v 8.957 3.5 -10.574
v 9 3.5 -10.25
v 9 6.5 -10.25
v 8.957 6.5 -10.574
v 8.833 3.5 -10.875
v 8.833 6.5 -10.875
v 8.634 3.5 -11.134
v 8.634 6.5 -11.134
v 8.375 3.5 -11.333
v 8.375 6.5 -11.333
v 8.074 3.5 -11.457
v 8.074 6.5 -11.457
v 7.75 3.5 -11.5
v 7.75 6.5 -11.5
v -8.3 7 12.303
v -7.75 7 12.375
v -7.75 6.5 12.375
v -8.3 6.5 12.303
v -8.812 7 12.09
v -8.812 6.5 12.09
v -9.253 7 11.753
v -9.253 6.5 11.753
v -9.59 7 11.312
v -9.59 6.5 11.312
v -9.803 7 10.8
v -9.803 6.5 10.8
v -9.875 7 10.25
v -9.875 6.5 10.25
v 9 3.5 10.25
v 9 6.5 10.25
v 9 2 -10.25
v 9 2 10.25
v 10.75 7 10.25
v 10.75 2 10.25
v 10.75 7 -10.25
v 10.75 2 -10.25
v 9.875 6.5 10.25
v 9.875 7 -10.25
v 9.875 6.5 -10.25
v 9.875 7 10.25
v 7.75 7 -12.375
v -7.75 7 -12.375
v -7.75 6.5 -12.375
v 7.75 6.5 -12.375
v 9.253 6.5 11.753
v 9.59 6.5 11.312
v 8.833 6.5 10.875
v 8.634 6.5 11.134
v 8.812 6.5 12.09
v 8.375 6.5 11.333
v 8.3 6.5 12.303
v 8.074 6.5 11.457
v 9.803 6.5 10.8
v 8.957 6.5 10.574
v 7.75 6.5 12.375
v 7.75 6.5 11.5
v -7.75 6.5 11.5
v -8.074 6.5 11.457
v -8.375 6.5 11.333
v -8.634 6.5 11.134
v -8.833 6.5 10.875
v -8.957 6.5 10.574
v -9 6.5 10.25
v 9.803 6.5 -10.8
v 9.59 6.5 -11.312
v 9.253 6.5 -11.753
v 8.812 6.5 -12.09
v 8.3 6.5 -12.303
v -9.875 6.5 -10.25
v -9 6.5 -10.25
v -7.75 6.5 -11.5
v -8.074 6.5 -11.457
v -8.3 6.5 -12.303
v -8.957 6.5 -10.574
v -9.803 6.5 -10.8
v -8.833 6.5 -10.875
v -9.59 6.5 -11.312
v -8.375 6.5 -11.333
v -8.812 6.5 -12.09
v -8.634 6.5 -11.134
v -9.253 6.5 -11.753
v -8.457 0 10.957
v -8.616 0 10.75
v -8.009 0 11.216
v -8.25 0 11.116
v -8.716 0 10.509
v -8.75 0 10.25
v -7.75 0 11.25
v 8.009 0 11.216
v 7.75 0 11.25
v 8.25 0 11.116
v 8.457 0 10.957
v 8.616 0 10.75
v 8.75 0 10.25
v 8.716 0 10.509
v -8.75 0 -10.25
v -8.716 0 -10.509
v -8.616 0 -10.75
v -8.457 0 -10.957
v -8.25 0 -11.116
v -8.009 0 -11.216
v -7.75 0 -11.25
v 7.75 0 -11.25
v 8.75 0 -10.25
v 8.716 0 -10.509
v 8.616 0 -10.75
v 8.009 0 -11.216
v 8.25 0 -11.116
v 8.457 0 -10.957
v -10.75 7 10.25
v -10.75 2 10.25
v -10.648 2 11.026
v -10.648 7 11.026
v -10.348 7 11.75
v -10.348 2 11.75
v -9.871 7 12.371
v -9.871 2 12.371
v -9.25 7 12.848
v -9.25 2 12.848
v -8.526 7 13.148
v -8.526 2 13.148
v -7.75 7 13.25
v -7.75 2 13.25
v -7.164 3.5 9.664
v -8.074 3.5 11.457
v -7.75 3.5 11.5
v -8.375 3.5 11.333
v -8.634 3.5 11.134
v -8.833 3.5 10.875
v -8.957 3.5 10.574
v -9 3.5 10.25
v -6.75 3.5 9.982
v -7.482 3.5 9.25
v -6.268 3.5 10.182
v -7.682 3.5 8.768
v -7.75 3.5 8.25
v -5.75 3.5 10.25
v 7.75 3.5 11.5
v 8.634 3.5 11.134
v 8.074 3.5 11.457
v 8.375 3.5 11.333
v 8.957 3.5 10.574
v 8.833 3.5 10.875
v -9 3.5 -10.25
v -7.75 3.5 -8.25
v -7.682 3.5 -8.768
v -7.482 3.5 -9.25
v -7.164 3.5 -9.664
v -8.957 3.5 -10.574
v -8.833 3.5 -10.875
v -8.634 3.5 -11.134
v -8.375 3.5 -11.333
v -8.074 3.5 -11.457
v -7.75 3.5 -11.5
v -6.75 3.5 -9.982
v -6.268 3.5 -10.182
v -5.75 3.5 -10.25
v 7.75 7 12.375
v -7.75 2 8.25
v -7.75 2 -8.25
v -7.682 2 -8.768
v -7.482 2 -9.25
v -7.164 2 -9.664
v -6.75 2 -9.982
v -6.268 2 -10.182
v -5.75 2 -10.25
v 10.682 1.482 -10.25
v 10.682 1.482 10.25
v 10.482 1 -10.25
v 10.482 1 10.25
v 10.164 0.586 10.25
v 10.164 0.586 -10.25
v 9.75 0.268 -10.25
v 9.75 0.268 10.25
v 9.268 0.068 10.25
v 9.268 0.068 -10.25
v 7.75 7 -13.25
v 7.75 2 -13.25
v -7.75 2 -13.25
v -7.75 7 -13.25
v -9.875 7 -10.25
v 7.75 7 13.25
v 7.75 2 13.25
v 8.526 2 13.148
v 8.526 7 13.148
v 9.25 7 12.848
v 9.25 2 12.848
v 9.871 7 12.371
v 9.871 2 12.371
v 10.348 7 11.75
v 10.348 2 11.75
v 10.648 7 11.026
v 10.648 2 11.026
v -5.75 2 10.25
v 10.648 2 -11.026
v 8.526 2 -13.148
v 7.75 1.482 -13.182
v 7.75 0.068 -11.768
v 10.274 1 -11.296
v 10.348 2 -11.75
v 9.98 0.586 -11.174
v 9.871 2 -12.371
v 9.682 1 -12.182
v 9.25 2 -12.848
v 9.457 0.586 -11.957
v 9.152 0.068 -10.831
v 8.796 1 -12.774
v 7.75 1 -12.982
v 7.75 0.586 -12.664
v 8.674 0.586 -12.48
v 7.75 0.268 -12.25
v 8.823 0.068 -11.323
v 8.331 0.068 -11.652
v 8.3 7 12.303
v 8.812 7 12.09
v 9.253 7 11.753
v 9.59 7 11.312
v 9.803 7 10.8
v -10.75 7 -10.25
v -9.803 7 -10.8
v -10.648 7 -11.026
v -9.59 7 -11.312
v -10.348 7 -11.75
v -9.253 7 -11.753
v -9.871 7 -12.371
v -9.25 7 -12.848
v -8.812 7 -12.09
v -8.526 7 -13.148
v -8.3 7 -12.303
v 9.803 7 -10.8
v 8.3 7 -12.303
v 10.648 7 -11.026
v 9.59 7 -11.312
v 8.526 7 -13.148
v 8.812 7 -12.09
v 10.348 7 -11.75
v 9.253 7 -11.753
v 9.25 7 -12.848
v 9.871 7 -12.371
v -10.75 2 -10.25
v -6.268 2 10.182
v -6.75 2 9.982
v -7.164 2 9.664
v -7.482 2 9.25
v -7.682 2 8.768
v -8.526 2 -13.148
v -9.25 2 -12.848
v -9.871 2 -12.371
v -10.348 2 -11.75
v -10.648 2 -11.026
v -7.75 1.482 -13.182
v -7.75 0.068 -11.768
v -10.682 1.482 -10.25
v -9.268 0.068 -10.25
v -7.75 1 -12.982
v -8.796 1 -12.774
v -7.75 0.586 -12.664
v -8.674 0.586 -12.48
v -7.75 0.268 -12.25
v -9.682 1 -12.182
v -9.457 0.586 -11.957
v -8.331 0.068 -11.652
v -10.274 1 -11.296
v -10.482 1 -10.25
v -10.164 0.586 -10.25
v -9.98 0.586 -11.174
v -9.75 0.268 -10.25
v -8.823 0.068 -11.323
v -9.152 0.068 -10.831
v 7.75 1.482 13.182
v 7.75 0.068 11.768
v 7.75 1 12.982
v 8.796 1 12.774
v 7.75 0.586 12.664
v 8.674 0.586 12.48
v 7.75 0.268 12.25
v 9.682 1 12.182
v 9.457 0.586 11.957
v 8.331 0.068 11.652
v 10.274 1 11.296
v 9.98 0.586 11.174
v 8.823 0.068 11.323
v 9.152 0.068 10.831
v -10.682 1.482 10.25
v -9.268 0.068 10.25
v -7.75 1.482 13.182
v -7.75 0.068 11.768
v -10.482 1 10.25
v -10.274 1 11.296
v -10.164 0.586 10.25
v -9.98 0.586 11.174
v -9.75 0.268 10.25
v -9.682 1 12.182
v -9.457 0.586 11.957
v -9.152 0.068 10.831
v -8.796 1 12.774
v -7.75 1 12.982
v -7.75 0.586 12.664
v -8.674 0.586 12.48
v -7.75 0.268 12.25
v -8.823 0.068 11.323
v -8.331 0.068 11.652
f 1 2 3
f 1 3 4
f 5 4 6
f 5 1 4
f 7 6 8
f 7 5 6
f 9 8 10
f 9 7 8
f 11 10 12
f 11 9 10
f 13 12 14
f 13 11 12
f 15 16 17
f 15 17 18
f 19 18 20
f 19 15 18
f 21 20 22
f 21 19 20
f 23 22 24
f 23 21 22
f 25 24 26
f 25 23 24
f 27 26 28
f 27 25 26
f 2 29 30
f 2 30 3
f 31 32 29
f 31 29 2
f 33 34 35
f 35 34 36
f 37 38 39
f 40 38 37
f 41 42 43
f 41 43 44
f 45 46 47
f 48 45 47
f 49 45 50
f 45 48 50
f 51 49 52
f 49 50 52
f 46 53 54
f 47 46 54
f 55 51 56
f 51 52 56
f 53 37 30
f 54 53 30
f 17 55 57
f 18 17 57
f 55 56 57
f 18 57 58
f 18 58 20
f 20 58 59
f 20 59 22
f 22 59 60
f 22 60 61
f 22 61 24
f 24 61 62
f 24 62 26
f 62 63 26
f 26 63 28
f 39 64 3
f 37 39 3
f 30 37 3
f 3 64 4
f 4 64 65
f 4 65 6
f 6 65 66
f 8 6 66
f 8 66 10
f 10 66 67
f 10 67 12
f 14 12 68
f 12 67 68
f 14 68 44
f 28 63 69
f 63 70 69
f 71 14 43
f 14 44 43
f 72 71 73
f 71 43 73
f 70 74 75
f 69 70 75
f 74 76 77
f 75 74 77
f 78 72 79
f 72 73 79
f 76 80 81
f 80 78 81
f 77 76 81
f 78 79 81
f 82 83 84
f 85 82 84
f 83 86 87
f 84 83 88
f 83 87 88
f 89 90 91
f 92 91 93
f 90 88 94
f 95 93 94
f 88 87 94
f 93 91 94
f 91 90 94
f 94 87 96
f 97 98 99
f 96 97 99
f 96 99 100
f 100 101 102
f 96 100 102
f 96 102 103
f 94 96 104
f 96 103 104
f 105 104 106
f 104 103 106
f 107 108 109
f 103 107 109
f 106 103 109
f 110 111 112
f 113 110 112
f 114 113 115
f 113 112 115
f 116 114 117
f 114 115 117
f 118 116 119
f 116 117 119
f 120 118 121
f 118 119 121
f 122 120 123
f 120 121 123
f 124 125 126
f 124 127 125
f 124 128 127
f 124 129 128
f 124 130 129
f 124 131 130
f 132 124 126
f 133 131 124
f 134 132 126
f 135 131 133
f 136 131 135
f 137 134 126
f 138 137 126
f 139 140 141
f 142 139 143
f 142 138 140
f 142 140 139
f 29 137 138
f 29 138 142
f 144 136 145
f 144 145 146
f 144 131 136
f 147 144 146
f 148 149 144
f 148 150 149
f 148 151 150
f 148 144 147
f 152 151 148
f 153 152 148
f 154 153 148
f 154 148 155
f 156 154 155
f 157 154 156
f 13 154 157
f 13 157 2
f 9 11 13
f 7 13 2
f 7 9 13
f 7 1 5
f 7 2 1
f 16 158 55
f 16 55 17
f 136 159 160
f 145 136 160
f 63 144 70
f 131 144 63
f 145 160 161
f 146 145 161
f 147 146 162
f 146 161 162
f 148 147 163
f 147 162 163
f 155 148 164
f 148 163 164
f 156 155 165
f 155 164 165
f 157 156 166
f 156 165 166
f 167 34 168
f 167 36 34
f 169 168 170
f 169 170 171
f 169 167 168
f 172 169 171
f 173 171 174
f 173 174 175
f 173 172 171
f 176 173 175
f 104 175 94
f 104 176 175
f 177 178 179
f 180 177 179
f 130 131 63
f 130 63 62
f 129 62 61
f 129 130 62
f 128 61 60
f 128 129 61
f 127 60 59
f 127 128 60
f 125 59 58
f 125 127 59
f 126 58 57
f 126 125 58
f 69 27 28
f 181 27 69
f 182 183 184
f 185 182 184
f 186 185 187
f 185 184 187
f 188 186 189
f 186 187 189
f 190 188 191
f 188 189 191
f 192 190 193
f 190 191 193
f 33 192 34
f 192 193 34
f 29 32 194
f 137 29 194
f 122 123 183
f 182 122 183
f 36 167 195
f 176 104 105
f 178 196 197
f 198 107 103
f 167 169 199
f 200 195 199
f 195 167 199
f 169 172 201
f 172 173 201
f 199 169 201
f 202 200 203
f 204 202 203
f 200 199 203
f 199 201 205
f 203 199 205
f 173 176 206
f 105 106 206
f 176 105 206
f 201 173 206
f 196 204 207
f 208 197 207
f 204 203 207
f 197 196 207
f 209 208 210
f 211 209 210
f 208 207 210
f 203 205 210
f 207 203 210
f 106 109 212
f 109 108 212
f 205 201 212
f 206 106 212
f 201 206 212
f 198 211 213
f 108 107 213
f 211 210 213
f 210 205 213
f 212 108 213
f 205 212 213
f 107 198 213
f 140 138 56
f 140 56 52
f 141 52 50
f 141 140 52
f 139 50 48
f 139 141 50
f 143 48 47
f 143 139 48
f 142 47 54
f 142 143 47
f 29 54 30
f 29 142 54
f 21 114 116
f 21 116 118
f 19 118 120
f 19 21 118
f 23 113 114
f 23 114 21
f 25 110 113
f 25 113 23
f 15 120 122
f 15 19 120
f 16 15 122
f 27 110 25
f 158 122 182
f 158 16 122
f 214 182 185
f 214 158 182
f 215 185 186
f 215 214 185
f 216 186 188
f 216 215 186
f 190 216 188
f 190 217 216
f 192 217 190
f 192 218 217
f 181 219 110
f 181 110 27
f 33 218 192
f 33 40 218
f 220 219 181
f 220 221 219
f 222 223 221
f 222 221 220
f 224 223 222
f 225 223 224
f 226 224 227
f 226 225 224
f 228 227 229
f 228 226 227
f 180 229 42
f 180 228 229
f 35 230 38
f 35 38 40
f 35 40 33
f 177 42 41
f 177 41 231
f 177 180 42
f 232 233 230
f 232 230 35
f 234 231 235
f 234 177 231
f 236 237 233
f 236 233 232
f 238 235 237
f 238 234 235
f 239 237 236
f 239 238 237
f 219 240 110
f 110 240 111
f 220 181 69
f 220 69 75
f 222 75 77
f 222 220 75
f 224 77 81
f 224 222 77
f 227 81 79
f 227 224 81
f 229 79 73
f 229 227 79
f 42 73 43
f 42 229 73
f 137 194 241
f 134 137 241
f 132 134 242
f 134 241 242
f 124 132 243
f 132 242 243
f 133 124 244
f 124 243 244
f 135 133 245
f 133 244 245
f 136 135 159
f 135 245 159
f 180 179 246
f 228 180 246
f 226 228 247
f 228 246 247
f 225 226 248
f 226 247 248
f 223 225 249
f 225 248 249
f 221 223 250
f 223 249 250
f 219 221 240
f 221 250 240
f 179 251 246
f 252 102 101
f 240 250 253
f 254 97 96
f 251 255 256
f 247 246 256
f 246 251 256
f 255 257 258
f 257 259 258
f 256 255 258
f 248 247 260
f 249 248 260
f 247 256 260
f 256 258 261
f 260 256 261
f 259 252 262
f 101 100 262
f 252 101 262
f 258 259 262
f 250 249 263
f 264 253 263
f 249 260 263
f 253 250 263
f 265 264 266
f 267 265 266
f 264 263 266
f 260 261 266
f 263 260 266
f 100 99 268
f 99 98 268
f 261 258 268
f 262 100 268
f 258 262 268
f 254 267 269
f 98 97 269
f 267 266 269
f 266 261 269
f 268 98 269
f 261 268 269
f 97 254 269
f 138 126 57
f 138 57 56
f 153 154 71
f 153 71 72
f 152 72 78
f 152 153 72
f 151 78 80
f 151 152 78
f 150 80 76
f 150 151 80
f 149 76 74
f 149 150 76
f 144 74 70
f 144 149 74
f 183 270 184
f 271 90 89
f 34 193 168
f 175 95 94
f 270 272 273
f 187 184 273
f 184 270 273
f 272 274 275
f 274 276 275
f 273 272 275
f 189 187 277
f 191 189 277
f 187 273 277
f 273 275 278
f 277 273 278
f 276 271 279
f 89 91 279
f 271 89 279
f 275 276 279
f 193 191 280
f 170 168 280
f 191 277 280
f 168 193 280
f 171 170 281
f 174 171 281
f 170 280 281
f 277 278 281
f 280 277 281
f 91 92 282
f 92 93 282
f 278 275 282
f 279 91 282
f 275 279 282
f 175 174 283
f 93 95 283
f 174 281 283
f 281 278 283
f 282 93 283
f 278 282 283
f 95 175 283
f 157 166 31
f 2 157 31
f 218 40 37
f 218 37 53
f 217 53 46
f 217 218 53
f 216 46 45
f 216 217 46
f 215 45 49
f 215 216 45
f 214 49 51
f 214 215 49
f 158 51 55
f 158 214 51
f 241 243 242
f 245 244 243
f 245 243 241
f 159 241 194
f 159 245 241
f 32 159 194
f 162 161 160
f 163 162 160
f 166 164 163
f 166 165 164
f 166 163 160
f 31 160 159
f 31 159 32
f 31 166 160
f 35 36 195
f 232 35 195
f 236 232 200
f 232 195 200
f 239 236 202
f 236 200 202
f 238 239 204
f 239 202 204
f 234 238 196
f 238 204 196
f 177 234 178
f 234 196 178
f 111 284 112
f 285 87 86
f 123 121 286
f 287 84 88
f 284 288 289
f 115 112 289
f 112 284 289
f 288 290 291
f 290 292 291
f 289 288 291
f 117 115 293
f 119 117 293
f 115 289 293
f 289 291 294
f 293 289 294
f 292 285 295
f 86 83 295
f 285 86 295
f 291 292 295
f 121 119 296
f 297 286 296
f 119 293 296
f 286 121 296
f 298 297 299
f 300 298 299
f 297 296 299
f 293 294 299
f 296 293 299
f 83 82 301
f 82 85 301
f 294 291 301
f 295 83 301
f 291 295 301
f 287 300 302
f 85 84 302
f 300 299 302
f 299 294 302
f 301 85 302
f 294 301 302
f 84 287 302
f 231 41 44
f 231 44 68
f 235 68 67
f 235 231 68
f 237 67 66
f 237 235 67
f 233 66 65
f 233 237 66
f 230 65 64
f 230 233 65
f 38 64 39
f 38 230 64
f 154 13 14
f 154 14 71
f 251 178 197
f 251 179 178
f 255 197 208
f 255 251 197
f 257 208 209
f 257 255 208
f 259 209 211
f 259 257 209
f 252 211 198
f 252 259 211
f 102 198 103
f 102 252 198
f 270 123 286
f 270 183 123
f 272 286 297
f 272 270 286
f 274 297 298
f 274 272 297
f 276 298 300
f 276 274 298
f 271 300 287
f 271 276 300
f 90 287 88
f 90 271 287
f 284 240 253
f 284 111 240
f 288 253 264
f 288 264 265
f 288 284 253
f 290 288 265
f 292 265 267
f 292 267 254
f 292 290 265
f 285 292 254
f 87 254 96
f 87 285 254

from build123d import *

# Parameters (mm, degrees)
BOSS_EXTRUDE1_DEPTH = 2
BOSS_EXTRUDE2_DEPTH = 5
BOSS_EXTRUDE3_DEPTH = 1.5
FILLET1_R           = 2
CUT_EXTRUDE1_DEPTH  = 0.5


with BuildPart() as part:
    # Sketch1 → Boss-Extrude1 (new body)
    with BuildSketch(Plane(origin=(0, 0, 0), x_dir=(1, 0, 0), z_dir=(0, 1, 0))):
        with BuildLine():
            Line((-7.75, -13.25), (7.75, -13.25))
            ThreePointArc((7.75, -13.25), (9.871320344, -12.371320344), (10.75, -10.25))
            Line((10.75, -10.25), (10.75, 10.25))
            ThreePointArc((10.75, 10.25), (9.871320344, 12.371320344), (7.75, 13.25))
            Line((7.75, 13.25), (-7.75, 13.25))
            ThreePointArc((-7.75, 13.25), (-9.871320344, 12.371320344), (-10.75, 10.25))
            Line((-10.75, 10.25), (-10.75, -10.25))
            ThreePointArc((-10.75, -10.25), (-9.871320344, -12.371320344), (-7.75, -13.25))
        make_face()
    extrude(amount=BOSS_EXTRUDE1_DEPTH)

    # Sketch2 → Boss-Extrude2 (add)
    with BuildSketch(Plane(origin=(0, 2, 0), x_dir=(1, 0, 0), z_dir=(0, 1, 0))):
        with BuildLine():
            Line((-7.75, -13.25), (7.75, -13.25))
            ThreePointArc((7.75, -13.25), (9.871320344, -12.371320344), (10.75, -10.25))
            Line((10.75, -10.25), (10.75, 10.25))
            ThreePointArc((10.75, 10.25), (9.871320344, 12.371320344), (7.75, 13.25))
            Line((7.75, 13.25), (-7.75, 13.25))
            ThreePointArc((-7.75, 13.25), (-9.871320344, 12.371320344), (-10.75, 10.25))
            Line((-10.75, 10.25), (-10.75, -10.25))
            ThreePointArc((-10.75, -10.25), (-9.871320344, -12.371320344), (-7.75, -13.25))
        make_face()
        with BuildLine():
            Line((-7.75, -11.5), (7.75, -11.5))
            ThreePointArc((7.75, -11.5), (8.633883476, -11.133883476), (9, -10.25))
            Line((9, -10.25), (9, 10.25))
            ThreePointArc((9, 10.25), (8.633883476, 11.133883476), (7.75, 11.5))
            Line((7.75, 11.5), (-7.75, 11.5))
            ThreePointArc((-7.75, 11.5), (-8.633883476, 11.133883476), (-9, 10.25))
            Line((-9, 10.25), (-9, -10.25))
            ThreePointArc((-9, -10.25), (-8.633883476, -11.133883476), (-7.75, -11.5))
        make_face(mode=Mode.SUBTRACT)
    extrude(amount=BOSS_EXTRUDE2_DEPTH)

    # Sketch3 → Boss-Extrude3 (add)
    with BuildSketch(Plane(origin=(0, 2, 0), x_dir=(1, 0, 0), z_dir=(0, 1, 0))):
        with BuildLine():
            Line((9, -10.25), (-5.75, -10.25))
            ThreePointArc((-5.75, -10.25), (-7.164213562, -9.664213562), (-7.75, -8.25))
            Line((-7.75, -8.25), (-7.75, 8.25))
            ThreePointArc((-7.75, 8.25), (-7.164213562, 9.664213562), (-5.75, 10.25))
            Line((-5.75, 10.25), (9, 10.25))
            Line((9, 10.25), (9, 12.25))
            Line((9, 12.25), (-9.75, 12.25))
            Line((-9.75, 12.25), (-9.75, -12.25))
            Line((-9.75, -12.25), (9, -12.25))
            Line((9, -12.25), (9, -10.25))
        make_face()
    extrude(amount=BOSS_EXTRUDE3_DEPTH)

    # Fillet1
    fillet1_edges = [part.edges().sort_by_distance(p)[0] for p in [
        (0, 0, 13.25),
        (-9.871320344, 0, 12.371320344),
        (-10.75, 0, 0),
        (-9.871320344, 0, -12.371320344),
        (0, 0, -13.25),
        (9.871320344, 0, -12.371320344),
        (10.75, 0, 0),
        (9.871320344, 0, 12.371320344),
    ]]
    fillet(fillet1_edges, radius=FILLET1_R)

    # Sketch4 → Cut-Extrude1 (cut)
    with BuildSketch(Plane(origin=(0, 7, 0), x_dir=(1, 0, 0), z_dir=(0, 1, 0))):
        with BuildLine():
            Line((-7.75, 12.375), (7.75, 12.375))
            ThreePointArc((7.75, 12.375), (9.25260191, 11.75260191), (9.875, 10.25))
            Line((9.875, 10.25), (9.875, -10.25))
            ThreePointArc((9.875, -10.25), (9.25260191, -11.75260191), (7.75, -12.375))
            Line((7.75, -12.375), (-7.75, -12.375))
            ThreePointArc((-7.75, -12.375), (-9.25260191, -11.75260191), (-9.875, -10.25))
            Line((-9.875, -10.25), (-9.875, 10.25))
            ThreePointArc((-9.875, 10.25), (-9.25260191, 11.75260191), (-7.75, 12.375))
        make_face()
    extrude(amount=-CUT_EXTRUDE1_DEPTH, mode=Mode.SUBTRACT)


solid = part.part
